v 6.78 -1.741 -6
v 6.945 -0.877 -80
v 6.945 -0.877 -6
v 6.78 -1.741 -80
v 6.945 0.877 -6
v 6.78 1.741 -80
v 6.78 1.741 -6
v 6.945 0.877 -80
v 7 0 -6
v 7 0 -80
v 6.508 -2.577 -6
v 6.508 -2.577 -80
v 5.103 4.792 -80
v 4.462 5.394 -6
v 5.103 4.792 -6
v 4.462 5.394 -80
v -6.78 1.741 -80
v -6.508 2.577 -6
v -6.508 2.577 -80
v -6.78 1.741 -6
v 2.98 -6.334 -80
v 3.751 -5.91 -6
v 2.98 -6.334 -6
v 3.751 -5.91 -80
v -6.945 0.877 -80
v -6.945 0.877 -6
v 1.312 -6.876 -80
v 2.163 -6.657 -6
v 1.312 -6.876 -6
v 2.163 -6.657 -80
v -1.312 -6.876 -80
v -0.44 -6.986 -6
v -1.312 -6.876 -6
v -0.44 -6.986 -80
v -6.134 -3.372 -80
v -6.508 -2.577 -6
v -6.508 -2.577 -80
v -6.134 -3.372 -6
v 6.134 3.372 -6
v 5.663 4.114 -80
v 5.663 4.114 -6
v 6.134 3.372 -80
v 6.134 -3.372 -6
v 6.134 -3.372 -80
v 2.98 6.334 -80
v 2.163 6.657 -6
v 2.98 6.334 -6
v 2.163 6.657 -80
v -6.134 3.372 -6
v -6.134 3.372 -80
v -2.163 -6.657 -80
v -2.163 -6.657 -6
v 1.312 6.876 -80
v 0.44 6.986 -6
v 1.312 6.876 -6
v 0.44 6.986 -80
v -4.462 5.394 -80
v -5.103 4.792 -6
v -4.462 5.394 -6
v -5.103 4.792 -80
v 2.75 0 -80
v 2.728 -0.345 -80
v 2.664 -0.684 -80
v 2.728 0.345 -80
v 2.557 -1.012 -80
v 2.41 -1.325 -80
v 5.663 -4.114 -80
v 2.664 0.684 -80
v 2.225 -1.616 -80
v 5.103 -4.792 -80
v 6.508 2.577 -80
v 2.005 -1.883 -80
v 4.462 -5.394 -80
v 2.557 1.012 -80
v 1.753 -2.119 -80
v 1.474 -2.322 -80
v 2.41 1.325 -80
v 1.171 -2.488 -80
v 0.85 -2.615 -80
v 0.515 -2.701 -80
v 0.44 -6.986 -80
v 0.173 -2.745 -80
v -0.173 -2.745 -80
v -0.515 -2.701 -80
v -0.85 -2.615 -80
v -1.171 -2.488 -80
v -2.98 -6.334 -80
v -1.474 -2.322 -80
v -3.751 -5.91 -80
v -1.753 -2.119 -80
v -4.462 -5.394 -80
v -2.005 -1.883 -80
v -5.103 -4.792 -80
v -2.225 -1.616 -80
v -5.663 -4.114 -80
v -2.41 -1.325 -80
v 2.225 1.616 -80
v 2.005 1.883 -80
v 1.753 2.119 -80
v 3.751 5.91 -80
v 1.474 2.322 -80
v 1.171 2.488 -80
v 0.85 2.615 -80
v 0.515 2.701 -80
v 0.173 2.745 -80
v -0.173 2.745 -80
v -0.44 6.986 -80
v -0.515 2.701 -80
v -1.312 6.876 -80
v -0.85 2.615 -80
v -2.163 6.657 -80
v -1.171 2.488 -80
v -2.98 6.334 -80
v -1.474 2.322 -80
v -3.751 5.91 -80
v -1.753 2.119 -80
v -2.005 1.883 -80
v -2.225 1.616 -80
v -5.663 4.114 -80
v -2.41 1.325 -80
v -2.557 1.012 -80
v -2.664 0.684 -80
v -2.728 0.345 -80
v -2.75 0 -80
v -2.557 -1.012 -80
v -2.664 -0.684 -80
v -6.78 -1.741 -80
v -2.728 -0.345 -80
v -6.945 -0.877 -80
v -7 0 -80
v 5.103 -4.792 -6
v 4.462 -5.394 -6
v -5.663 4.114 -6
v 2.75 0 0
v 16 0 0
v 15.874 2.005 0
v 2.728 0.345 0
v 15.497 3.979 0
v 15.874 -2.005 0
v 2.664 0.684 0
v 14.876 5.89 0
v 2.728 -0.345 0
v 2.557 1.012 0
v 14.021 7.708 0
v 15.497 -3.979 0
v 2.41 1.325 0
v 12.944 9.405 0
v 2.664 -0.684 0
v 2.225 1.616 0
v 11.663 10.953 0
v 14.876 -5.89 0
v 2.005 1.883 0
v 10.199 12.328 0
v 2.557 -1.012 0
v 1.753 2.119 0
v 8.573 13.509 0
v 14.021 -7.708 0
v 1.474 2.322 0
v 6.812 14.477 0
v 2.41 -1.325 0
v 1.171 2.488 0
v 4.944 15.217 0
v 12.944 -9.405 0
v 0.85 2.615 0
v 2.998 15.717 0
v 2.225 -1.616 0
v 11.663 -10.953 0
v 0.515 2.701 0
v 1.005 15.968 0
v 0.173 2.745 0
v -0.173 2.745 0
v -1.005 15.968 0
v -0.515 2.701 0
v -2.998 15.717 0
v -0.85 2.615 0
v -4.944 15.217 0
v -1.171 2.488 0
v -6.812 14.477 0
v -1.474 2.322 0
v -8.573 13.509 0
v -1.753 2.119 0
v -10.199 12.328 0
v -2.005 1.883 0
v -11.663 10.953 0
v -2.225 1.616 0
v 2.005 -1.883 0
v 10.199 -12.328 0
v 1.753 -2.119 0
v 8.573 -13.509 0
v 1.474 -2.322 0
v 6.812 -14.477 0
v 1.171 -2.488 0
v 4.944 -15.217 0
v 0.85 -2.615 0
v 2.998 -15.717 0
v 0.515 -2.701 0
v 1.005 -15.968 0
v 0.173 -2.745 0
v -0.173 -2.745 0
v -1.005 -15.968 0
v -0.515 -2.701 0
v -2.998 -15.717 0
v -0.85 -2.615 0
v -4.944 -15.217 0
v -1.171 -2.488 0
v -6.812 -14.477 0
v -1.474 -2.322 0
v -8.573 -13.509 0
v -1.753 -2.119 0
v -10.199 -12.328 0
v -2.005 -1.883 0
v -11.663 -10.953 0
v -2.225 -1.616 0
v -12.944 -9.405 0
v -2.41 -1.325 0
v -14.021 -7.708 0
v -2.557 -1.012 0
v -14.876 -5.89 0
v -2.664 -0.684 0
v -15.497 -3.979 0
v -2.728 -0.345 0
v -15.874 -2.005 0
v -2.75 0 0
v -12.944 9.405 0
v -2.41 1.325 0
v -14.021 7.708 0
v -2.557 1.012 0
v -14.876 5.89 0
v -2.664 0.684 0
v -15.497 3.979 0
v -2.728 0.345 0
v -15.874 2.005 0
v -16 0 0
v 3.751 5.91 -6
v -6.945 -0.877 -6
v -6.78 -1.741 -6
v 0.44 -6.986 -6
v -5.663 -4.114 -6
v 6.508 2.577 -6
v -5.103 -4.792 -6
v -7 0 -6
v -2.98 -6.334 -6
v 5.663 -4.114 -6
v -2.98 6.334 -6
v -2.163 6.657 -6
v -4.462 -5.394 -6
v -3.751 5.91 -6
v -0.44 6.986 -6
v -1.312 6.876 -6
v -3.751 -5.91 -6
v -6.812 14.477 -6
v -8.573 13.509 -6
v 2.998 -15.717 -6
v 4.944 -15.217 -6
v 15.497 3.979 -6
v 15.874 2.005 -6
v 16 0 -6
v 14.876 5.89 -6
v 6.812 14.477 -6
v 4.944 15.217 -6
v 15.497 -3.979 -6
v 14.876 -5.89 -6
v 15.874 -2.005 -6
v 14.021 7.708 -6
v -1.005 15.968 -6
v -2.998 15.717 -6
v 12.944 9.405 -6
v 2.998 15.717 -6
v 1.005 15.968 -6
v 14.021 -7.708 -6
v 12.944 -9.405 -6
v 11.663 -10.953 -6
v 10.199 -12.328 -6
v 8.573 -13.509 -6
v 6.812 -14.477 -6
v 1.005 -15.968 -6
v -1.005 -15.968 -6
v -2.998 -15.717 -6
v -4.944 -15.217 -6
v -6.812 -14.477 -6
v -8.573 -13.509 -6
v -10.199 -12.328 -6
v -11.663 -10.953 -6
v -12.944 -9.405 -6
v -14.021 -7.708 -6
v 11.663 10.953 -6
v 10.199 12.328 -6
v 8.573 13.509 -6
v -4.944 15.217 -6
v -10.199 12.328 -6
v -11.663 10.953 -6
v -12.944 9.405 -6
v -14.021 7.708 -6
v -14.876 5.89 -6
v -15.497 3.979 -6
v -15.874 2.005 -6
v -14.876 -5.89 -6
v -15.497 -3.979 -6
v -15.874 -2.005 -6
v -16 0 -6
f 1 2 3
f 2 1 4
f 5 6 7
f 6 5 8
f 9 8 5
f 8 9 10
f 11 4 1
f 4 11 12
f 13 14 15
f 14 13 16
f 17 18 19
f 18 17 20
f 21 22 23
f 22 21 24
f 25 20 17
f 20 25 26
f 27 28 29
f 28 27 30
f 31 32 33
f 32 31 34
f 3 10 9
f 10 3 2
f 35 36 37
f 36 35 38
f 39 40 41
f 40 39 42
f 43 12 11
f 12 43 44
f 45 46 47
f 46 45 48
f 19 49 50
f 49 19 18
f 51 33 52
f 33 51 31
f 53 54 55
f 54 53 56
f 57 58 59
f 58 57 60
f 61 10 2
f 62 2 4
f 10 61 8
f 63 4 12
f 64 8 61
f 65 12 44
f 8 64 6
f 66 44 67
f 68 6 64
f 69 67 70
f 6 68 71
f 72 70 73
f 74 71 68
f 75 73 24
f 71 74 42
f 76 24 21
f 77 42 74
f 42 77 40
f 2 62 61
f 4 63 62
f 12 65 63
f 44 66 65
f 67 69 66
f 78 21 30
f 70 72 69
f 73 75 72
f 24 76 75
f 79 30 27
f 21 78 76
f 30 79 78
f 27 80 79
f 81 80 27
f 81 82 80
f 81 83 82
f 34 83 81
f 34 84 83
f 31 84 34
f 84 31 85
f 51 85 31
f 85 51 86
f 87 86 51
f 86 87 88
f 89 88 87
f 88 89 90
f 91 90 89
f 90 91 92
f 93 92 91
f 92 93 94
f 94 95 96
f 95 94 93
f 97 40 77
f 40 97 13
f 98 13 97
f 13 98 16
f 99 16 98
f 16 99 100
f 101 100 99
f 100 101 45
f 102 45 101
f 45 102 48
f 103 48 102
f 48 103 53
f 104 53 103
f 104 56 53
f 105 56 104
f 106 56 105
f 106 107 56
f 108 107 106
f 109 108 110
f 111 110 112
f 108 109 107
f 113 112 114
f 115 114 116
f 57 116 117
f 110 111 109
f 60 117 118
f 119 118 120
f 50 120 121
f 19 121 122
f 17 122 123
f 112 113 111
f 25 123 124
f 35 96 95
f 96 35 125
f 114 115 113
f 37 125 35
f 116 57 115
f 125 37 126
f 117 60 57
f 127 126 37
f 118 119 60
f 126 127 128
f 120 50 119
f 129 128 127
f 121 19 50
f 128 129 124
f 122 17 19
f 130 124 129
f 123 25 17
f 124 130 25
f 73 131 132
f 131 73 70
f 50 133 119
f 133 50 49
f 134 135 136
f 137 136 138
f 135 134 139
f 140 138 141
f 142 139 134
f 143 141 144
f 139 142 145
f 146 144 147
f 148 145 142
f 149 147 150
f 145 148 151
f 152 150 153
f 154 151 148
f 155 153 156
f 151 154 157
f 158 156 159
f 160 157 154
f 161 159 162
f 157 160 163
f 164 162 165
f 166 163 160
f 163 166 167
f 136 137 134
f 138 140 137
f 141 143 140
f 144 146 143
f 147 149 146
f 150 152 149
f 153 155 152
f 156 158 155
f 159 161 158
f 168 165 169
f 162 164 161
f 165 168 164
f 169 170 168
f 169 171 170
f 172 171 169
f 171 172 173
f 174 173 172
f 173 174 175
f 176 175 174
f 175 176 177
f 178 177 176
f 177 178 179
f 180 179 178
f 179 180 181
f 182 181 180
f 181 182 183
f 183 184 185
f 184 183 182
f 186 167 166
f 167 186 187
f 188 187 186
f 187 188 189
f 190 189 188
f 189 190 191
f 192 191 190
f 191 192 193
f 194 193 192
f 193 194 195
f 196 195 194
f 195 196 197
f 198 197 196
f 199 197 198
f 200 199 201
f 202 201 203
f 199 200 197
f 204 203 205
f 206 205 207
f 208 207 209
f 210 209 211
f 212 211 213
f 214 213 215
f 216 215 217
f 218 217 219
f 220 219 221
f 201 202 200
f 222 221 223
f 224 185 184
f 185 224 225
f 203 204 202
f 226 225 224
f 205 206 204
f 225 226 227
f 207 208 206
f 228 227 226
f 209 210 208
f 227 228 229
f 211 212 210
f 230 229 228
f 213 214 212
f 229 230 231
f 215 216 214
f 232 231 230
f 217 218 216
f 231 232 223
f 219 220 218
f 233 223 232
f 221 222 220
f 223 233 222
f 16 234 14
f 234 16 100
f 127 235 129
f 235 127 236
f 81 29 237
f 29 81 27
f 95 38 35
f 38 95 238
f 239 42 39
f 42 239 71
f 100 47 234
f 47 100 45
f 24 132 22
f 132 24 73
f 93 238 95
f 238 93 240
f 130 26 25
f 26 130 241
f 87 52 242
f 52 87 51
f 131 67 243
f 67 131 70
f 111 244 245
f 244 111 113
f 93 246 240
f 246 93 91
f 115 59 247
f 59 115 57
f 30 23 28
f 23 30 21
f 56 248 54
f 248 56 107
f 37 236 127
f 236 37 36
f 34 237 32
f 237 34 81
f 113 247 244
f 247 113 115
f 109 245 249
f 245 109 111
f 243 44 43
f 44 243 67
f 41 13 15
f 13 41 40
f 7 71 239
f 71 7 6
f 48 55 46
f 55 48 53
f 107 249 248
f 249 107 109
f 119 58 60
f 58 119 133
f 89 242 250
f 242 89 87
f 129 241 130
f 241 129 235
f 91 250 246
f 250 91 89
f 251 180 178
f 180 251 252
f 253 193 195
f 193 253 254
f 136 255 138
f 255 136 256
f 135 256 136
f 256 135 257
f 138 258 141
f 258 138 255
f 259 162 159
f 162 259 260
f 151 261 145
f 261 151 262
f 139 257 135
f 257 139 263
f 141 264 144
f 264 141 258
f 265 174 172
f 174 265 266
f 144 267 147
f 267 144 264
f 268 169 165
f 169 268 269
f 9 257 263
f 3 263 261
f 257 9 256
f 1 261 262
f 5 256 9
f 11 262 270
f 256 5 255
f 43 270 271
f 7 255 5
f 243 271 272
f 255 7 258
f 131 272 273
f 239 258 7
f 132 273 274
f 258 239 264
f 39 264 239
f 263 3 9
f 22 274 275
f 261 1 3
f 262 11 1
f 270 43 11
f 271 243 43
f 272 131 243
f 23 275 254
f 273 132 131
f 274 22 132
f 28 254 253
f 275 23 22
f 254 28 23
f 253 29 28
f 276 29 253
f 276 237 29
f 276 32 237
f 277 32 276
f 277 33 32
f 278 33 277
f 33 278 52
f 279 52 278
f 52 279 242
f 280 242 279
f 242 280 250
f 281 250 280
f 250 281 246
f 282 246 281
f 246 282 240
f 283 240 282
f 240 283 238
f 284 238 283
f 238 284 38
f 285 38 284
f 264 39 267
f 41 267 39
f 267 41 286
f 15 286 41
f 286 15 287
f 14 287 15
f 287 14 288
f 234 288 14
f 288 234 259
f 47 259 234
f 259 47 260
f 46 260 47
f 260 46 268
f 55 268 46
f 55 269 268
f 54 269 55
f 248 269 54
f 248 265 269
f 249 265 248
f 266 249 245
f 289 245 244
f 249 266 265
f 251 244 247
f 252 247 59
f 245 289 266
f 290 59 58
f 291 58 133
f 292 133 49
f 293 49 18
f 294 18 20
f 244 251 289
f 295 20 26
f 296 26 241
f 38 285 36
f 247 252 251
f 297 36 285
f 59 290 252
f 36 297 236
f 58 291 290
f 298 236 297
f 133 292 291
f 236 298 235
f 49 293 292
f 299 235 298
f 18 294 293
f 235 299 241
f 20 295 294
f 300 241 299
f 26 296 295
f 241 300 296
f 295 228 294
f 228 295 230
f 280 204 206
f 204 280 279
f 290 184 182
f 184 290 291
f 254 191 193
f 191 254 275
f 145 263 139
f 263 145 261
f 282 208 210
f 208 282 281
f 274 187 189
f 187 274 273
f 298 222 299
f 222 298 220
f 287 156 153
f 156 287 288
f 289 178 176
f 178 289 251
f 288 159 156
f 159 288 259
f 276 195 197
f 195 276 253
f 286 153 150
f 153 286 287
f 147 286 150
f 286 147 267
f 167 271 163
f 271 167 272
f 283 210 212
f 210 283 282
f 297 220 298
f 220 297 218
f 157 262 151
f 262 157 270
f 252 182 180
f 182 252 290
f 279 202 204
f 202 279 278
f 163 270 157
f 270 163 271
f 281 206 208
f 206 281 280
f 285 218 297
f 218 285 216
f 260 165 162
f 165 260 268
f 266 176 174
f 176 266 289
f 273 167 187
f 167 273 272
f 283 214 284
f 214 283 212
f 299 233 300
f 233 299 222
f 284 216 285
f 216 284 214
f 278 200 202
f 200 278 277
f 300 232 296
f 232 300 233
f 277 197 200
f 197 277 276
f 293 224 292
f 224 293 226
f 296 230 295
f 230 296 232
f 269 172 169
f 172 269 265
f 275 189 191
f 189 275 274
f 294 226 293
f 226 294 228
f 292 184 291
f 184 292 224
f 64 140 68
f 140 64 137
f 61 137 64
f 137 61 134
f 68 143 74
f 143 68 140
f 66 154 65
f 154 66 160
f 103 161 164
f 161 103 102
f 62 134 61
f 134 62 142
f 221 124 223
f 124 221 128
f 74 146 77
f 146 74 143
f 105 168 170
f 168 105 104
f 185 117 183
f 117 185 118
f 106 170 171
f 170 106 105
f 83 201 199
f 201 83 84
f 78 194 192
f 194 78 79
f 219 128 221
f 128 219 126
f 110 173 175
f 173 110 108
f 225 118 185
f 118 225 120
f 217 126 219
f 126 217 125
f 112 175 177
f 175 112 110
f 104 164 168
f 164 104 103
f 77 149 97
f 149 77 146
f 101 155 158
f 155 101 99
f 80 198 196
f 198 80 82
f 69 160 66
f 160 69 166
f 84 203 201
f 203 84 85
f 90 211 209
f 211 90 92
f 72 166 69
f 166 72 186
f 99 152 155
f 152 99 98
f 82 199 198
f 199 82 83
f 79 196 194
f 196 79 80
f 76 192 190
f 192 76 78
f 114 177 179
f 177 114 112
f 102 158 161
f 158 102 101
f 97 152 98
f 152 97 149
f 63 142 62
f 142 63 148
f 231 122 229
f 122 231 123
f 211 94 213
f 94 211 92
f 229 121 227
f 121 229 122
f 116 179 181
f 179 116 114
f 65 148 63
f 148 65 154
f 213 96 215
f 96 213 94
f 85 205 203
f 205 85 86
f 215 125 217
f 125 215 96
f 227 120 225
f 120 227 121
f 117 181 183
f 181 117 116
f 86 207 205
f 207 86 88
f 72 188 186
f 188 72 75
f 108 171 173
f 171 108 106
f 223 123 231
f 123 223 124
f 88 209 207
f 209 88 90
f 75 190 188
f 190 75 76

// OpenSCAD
$fn = 50;


difference() {
	union() {
		translate(v = [0, 0, -80.0000000000]) {
			cylinder(h = 80, r = 7.0000000000);
		}
		translate(v = [0, 0, -6.0000000000]) {
			cylinder(h = 6, r = 16.0000000000);
		}
	}
	union() {
		#translate(v = [0, 0, -80]) {
			cylinder(h = 80, r = 2.7500000000);
		}
	}
}
